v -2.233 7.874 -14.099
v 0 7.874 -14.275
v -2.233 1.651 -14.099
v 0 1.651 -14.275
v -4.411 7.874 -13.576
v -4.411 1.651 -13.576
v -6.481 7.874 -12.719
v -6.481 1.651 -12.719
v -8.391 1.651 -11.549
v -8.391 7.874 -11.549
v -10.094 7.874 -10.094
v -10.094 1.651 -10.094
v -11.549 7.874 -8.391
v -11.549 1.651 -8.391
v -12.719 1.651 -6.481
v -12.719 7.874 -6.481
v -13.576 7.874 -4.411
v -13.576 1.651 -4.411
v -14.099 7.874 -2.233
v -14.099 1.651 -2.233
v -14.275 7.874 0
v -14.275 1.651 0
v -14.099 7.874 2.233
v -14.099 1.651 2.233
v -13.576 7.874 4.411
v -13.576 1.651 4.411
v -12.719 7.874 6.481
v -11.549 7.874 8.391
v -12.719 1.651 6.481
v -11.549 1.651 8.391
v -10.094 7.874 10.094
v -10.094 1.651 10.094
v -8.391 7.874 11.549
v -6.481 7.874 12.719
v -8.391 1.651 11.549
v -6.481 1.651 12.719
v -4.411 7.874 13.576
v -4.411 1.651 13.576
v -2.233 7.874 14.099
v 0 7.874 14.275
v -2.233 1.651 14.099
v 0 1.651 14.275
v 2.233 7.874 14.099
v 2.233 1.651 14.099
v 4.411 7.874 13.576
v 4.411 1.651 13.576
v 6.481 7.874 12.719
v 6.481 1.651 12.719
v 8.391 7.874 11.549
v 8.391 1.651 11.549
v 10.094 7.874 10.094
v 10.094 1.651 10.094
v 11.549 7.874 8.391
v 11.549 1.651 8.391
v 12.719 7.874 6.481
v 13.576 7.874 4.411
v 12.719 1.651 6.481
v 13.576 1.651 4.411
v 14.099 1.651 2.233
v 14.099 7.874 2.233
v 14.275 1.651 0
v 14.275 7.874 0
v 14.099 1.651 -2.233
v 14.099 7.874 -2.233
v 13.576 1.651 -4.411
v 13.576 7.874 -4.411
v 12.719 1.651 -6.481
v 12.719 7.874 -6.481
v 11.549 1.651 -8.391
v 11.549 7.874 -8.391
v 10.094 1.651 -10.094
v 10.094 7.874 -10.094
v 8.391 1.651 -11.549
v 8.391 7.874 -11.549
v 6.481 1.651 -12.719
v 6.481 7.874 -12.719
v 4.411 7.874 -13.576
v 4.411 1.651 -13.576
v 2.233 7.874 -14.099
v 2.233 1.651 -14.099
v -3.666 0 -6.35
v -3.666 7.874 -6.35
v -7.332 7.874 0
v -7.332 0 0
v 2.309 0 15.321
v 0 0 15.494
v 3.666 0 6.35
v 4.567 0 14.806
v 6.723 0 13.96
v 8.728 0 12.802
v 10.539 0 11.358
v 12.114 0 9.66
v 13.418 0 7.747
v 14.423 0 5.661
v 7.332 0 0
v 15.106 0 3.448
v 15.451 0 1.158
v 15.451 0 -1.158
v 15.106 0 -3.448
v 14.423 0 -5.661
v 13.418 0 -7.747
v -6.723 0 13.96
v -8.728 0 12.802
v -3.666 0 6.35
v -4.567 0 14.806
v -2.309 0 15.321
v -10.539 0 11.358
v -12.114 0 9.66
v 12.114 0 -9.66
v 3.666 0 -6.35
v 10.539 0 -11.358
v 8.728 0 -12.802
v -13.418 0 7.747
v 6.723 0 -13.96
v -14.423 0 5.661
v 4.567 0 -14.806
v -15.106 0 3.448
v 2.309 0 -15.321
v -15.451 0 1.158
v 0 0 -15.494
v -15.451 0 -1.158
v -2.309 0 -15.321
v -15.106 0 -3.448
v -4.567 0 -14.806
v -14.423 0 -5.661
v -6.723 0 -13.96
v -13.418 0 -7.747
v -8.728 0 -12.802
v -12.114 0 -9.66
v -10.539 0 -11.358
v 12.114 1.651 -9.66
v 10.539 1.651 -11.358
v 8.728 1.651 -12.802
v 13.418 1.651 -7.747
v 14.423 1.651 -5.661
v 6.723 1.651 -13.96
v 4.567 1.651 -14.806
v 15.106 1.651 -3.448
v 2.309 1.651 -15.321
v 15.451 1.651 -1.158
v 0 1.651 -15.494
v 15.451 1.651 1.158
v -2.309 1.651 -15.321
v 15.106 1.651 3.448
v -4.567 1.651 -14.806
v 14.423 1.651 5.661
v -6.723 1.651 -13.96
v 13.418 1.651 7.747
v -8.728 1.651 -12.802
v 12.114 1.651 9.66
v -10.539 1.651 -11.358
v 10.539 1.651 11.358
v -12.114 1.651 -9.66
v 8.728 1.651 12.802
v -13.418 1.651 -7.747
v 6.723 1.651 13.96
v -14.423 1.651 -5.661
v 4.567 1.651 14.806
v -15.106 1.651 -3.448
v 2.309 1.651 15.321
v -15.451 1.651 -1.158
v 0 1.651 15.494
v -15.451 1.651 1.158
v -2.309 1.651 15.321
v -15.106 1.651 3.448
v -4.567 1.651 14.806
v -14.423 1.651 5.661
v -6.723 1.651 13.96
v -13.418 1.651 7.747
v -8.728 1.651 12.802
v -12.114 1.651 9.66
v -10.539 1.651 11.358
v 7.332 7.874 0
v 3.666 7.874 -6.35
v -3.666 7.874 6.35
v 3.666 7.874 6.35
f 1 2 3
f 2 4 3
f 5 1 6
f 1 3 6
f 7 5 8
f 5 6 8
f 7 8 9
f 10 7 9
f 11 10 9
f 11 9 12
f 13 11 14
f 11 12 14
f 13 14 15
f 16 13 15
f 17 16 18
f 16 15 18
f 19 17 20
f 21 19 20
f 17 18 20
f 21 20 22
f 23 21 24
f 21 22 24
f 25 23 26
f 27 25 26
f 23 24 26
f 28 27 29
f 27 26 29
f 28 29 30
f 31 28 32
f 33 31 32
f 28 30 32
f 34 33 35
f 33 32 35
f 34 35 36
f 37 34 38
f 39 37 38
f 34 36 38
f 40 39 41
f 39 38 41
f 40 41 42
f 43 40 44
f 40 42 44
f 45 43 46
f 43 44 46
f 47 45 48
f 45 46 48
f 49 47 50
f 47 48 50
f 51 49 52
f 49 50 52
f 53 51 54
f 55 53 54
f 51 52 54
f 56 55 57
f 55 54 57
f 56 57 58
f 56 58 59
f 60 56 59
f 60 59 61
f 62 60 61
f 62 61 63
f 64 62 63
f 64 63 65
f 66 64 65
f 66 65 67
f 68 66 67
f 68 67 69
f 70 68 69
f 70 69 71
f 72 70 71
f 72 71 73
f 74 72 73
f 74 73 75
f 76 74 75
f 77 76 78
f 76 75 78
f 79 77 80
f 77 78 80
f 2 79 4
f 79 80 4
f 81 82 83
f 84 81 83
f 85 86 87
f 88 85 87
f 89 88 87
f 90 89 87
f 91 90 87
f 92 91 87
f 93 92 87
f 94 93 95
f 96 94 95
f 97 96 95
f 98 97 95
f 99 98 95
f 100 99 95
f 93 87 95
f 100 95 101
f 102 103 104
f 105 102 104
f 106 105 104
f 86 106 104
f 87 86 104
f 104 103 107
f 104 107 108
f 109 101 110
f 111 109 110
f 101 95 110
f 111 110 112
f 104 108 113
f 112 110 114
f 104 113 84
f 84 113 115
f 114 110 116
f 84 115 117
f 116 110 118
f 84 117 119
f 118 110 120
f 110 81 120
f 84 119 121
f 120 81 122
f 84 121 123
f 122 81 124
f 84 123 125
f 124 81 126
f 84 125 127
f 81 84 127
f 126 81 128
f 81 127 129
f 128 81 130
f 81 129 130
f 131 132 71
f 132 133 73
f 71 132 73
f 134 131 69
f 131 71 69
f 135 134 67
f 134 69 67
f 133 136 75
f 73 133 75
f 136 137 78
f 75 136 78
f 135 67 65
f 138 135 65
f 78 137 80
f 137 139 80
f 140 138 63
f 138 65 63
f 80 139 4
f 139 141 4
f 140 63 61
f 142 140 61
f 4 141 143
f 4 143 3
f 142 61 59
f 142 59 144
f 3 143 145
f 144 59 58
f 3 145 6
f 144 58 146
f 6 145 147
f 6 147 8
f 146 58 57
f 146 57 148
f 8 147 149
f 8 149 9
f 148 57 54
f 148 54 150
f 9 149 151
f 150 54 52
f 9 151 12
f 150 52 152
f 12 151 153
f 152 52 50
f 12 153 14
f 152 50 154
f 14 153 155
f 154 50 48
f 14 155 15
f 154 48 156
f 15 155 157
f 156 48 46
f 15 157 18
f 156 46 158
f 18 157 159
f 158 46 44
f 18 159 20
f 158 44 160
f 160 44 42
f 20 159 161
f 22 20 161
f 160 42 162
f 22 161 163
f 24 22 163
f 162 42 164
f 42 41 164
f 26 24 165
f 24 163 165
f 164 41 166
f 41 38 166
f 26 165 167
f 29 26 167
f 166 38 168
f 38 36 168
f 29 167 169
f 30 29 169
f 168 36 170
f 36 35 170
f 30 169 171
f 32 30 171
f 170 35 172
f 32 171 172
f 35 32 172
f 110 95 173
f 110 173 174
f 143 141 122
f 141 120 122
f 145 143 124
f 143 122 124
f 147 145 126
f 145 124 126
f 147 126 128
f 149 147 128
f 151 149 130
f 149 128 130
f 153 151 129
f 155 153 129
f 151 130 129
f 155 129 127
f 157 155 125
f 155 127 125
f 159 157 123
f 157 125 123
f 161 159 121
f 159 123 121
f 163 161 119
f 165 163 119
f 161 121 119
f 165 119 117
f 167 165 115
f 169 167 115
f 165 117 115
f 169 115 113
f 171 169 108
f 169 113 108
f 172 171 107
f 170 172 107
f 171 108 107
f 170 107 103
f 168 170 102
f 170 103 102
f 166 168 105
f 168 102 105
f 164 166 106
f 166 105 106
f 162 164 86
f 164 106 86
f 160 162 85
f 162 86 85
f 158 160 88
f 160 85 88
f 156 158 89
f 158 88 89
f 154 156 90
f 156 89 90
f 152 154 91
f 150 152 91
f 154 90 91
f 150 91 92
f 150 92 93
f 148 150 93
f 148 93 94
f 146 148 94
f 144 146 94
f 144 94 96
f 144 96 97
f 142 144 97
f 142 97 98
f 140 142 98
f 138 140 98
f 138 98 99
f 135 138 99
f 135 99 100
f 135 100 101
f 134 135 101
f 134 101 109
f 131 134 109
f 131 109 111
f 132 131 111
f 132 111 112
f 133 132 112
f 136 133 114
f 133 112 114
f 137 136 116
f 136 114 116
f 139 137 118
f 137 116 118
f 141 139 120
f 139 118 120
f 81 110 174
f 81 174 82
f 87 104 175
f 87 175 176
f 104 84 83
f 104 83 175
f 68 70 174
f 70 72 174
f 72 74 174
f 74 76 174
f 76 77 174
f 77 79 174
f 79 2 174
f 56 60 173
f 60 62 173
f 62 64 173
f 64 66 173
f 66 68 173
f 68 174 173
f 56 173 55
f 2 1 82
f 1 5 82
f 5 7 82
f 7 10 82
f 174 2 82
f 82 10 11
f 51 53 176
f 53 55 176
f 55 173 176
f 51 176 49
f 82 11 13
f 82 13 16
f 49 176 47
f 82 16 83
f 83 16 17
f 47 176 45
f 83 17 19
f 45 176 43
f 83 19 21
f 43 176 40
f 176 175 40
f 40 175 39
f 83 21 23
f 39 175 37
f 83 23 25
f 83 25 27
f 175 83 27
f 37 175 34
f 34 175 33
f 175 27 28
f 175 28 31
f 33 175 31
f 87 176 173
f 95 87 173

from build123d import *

# Parameters (mm, degrees)
CUT_EXTRUDE1_DEPTH = 24.28364121


with BuildPart() as part:
    # Sketch3 → Revolve1 (revolve)
    with BuildSketch(Plane(origin=(0, 0, 0), x_dir=(0, 0, -1), z_dir=(1, 0, 0))):
        Polygon((0, 7.874), (14.2748, 7.874), (14.2748, 1.651), (15.494, 1.651), (15.494, 0), (0, 0), align=None)
    revolve(axis=Axis((0, 0, 0), (0, 1, 0)))

    # Sketch4 → Cut-Extrude1 (cut, through all)
    with BuildSketch(Plane(origin=(0, 7.874, 0), x_dir=(1, 0, 0), z_dir=(0, 1, 0))):
        Polygon((-3.666174209, 6.35), (-7.332348419, 0), (-3.666174209, -6.35), (3.666174209, -6.35), (7.332348419, 0), (3.666174209, 6.35), align=None)
    extrude(amount=-CUT_EXTRUDE1_DEPTH, mode=Mode.SUBTRACT)


solid = part.part
